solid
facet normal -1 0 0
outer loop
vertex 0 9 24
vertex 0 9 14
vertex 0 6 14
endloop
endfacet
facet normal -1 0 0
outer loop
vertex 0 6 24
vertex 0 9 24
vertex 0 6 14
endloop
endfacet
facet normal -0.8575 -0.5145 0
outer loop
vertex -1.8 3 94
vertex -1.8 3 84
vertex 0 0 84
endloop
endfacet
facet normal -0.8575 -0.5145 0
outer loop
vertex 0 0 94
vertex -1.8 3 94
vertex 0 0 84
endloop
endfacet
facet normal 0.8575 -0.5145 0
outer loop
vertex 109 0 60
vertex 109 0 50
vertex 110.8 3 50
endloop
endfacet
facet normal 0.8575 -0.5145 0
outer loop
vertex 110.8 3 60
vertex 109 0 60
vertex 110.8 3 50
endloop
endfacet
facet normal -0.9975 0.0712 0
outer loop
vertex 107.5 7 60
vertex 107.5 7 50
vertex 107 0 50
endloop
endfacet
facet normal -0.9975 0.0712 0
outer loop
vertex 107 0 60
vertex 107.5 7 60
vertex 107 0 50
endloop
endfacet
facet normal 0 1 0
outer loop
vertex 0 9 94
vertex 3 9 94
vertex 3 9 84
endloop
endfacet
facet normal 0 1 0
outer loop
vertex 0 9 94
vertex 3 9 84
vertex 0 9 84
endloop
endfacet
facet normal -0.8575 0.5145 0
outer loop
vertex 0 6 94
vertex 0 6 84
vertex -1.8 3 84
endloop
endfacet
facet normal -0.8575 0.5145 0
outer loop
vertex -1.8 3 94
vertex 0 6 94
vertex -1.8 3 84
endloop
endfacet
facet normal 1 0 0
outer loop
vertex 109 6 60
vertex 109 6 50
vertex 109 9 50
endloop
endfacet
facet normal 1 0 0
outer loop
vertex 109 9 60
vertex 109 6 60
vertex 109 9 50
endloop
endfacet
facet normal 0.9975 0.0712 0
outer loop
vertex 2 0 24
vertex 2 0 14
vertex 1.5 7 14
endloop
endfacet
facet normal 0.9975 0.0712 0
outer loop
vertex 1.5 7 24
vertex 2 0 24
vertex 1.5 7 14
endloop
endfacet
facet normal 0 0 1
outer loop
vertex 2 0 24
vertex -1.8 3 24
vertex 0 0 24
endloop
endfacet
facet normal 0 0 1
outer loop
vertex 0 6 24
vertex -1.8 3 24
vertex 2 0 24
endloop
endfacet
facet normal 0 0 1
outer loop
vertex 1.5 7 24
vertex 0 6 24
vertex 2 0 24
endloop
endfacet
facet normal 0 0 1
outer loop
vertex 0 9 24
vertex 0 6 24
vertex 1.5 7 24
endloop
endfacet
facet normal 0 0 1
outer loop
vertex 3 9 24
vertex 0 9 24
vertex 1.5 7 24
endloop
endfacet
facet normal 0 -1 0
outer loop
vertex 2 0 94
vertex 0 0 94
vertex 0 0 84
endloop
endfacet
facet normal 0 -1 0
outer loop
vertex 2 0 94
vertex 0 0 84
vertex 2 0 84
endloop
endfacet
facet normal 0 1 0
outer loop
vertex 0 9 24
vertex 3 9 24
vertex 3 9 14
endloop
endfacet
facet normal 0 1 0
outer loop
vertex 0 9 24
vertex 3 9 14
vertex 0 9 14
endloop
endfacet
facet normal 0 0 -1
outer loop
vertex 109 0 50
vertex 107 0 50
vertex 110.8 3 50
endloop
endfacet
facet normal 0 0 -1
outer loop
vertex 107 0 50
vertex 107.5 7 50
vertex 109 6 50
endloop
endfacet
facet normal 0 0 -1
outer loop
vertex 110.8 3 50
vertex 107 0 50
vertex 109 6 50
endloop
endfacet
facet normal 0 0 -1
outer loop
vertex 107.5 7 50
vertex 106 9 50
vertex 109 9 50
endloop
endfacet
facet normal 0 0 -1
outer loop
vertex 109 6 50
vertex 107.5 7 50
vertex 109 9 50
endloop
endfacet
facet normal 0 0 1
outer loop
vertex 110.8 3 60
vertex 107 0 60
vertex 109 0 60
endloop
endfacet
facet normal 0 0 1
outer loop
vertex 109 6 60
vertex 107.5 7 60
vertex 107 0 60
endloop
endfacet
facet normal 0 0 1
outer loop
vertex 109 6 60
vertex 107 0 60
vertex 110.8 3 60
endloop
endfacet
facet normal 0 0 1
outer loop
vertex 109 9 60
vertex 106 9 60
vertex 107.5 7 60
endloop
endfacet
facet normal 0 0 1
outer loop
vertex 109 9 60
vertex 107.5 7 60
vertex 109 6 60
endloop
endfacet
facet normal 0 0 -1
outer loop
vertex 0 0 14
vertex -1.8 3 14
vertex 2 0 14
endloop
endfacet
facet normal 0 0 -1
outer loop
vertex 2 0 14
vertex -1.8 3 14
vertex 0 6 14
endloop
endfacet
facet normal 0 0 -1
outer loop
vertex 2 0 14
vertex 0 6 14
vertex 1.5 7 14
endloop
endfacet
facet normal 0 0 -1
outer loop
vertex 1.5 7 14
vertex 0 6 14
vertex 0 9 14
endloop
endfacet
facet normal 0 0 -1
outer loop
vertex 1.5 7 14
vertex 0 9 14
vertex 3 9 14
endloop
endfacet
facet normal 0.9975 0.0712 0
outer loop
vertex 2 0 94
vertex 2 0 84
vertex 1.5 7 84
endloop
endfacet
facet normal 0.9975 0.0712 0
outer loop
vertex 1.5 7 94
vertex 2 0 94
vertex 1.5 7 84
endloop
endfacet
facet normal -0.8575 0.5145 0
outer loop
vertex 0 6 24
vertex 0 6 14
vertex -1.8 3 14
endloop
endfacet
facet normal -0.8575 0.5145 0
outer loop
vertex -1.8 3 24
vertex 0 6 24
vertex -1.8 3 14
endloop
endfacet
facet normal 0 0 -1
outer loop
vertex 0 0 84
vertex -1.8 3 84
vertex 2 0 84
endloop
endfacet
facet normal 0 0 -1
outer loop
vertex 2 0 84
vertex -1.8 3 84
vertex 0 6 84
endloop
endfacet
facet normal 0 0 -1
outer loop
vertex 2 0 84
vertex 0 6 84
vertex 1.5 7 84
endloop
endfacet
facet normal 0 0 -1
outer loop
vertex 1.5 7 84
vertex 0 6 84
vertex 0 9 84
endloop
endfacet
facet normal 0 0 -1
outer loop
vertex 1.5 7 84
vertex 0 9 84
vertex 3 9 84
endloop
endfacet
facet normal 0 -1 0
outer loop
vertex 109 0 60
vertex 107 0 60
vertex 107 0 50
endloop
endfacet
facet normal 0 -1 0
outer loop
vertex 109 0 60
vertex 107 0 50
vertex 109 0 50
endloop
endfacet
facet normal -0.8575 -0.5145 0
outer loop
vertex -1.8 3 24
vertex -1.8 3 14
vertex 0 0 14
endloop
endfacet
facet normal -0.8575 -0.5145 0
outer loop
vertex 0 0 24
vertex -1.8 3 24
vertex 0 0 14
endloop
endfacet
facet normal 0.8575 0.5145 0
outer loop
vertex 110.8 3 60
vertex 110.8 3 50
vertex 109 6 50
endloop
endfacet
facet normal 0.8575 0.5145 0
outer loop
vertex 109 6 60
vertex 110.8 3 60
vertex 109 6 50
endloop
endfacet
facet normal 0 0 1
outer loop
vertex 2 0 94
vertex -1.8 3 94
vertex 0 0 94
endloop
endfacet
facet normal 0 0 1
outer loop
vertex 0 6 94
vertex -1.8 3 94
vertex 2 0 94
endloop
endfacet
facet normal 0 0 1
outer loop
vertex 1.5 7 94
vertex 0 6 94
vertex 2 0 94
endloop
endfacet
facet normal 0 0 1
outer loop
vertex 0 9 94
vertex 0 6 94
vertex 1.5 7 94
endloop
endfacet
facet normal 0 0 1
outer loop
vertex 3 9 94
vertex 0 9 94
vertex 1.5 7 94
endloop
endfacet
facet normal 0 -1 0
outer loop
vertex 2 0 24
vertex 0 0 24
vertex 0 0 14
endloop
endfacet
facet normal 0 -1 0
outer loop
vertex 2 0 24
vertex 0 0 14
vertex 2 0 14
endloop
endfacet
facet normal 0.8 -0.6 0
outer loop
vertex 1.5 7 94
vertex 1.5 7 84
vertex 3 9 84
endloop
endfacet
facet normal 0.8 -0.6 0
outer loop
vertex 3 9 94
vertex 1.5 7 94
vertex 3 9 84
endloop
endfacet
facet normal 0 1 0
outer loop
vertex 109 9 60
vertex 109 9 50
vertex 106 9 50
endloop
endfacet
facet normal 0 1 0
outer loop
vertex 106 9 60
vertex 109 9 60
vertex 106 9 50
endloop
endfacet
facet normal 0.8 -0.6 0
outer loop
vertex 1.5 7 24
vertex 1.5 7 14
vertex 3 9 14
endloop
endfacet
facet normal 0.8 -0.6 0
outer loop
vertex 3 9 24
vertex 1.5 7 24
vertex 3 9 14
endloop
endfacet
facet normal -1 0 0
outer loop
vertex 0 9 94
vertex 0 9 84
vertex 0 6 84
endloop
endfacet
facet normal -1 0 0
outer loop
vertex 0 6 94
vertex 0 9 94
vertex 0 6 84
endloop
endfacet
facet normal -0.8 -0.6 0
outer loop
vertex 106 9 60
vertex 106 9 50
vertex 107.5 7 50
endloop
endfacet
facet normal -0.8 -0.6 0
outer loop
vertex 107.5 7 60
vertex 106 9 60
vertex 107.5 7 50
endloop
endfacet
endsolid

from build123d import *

# Parameters (mm, degrees)
PAD005_DEPTH = 10
PAD004_DEPTH = 10
PAD006_DEPTH = 10


with BuildPart() as snap2:
    # Sketch005 → Pad005 (new body)
    with BuildSketch(Plane.XY.offset(84)):
        Polygon((0, 9), (0, 6), (-1.8, 3), (0, 0), (2, 0), (1.5, 7), (3, 9), align=None)
    extrude(amount=PAD005_DEPTH)


with BuildPart() as fusion006:
    # Sketch004 → Pad004 (new body)
    with BuildSketch(Plane.XY.offset(14)):
        Polygon((0, 9), (0, 6), (-1.8, 3), (0, 0), (2, 0), (1.5, 7), (3, 9), align=None)
    extrude(amount=PAD004_DEPTH)

    # Fusion006: union Snap2
    add(snap2.part)


with BuildPart() as snaps:
    # Sketch006 → Pad006 (new body)
    with BuildSketch(Plane(origin=(-2, 0, 50), x_dir=(1, 0, 0), z_dir=(0, 0, 1))):
        Polygon((111, 0), (112.8, 3), (111, 6), (111, 9), (108, 9), (109.5, 7), (109, 0), align=None)
    extrude(amount=PAD006_DEPTH)

    # Fusion007: union Fusion006
    add(fusion006.part)


solid = snaps.part
